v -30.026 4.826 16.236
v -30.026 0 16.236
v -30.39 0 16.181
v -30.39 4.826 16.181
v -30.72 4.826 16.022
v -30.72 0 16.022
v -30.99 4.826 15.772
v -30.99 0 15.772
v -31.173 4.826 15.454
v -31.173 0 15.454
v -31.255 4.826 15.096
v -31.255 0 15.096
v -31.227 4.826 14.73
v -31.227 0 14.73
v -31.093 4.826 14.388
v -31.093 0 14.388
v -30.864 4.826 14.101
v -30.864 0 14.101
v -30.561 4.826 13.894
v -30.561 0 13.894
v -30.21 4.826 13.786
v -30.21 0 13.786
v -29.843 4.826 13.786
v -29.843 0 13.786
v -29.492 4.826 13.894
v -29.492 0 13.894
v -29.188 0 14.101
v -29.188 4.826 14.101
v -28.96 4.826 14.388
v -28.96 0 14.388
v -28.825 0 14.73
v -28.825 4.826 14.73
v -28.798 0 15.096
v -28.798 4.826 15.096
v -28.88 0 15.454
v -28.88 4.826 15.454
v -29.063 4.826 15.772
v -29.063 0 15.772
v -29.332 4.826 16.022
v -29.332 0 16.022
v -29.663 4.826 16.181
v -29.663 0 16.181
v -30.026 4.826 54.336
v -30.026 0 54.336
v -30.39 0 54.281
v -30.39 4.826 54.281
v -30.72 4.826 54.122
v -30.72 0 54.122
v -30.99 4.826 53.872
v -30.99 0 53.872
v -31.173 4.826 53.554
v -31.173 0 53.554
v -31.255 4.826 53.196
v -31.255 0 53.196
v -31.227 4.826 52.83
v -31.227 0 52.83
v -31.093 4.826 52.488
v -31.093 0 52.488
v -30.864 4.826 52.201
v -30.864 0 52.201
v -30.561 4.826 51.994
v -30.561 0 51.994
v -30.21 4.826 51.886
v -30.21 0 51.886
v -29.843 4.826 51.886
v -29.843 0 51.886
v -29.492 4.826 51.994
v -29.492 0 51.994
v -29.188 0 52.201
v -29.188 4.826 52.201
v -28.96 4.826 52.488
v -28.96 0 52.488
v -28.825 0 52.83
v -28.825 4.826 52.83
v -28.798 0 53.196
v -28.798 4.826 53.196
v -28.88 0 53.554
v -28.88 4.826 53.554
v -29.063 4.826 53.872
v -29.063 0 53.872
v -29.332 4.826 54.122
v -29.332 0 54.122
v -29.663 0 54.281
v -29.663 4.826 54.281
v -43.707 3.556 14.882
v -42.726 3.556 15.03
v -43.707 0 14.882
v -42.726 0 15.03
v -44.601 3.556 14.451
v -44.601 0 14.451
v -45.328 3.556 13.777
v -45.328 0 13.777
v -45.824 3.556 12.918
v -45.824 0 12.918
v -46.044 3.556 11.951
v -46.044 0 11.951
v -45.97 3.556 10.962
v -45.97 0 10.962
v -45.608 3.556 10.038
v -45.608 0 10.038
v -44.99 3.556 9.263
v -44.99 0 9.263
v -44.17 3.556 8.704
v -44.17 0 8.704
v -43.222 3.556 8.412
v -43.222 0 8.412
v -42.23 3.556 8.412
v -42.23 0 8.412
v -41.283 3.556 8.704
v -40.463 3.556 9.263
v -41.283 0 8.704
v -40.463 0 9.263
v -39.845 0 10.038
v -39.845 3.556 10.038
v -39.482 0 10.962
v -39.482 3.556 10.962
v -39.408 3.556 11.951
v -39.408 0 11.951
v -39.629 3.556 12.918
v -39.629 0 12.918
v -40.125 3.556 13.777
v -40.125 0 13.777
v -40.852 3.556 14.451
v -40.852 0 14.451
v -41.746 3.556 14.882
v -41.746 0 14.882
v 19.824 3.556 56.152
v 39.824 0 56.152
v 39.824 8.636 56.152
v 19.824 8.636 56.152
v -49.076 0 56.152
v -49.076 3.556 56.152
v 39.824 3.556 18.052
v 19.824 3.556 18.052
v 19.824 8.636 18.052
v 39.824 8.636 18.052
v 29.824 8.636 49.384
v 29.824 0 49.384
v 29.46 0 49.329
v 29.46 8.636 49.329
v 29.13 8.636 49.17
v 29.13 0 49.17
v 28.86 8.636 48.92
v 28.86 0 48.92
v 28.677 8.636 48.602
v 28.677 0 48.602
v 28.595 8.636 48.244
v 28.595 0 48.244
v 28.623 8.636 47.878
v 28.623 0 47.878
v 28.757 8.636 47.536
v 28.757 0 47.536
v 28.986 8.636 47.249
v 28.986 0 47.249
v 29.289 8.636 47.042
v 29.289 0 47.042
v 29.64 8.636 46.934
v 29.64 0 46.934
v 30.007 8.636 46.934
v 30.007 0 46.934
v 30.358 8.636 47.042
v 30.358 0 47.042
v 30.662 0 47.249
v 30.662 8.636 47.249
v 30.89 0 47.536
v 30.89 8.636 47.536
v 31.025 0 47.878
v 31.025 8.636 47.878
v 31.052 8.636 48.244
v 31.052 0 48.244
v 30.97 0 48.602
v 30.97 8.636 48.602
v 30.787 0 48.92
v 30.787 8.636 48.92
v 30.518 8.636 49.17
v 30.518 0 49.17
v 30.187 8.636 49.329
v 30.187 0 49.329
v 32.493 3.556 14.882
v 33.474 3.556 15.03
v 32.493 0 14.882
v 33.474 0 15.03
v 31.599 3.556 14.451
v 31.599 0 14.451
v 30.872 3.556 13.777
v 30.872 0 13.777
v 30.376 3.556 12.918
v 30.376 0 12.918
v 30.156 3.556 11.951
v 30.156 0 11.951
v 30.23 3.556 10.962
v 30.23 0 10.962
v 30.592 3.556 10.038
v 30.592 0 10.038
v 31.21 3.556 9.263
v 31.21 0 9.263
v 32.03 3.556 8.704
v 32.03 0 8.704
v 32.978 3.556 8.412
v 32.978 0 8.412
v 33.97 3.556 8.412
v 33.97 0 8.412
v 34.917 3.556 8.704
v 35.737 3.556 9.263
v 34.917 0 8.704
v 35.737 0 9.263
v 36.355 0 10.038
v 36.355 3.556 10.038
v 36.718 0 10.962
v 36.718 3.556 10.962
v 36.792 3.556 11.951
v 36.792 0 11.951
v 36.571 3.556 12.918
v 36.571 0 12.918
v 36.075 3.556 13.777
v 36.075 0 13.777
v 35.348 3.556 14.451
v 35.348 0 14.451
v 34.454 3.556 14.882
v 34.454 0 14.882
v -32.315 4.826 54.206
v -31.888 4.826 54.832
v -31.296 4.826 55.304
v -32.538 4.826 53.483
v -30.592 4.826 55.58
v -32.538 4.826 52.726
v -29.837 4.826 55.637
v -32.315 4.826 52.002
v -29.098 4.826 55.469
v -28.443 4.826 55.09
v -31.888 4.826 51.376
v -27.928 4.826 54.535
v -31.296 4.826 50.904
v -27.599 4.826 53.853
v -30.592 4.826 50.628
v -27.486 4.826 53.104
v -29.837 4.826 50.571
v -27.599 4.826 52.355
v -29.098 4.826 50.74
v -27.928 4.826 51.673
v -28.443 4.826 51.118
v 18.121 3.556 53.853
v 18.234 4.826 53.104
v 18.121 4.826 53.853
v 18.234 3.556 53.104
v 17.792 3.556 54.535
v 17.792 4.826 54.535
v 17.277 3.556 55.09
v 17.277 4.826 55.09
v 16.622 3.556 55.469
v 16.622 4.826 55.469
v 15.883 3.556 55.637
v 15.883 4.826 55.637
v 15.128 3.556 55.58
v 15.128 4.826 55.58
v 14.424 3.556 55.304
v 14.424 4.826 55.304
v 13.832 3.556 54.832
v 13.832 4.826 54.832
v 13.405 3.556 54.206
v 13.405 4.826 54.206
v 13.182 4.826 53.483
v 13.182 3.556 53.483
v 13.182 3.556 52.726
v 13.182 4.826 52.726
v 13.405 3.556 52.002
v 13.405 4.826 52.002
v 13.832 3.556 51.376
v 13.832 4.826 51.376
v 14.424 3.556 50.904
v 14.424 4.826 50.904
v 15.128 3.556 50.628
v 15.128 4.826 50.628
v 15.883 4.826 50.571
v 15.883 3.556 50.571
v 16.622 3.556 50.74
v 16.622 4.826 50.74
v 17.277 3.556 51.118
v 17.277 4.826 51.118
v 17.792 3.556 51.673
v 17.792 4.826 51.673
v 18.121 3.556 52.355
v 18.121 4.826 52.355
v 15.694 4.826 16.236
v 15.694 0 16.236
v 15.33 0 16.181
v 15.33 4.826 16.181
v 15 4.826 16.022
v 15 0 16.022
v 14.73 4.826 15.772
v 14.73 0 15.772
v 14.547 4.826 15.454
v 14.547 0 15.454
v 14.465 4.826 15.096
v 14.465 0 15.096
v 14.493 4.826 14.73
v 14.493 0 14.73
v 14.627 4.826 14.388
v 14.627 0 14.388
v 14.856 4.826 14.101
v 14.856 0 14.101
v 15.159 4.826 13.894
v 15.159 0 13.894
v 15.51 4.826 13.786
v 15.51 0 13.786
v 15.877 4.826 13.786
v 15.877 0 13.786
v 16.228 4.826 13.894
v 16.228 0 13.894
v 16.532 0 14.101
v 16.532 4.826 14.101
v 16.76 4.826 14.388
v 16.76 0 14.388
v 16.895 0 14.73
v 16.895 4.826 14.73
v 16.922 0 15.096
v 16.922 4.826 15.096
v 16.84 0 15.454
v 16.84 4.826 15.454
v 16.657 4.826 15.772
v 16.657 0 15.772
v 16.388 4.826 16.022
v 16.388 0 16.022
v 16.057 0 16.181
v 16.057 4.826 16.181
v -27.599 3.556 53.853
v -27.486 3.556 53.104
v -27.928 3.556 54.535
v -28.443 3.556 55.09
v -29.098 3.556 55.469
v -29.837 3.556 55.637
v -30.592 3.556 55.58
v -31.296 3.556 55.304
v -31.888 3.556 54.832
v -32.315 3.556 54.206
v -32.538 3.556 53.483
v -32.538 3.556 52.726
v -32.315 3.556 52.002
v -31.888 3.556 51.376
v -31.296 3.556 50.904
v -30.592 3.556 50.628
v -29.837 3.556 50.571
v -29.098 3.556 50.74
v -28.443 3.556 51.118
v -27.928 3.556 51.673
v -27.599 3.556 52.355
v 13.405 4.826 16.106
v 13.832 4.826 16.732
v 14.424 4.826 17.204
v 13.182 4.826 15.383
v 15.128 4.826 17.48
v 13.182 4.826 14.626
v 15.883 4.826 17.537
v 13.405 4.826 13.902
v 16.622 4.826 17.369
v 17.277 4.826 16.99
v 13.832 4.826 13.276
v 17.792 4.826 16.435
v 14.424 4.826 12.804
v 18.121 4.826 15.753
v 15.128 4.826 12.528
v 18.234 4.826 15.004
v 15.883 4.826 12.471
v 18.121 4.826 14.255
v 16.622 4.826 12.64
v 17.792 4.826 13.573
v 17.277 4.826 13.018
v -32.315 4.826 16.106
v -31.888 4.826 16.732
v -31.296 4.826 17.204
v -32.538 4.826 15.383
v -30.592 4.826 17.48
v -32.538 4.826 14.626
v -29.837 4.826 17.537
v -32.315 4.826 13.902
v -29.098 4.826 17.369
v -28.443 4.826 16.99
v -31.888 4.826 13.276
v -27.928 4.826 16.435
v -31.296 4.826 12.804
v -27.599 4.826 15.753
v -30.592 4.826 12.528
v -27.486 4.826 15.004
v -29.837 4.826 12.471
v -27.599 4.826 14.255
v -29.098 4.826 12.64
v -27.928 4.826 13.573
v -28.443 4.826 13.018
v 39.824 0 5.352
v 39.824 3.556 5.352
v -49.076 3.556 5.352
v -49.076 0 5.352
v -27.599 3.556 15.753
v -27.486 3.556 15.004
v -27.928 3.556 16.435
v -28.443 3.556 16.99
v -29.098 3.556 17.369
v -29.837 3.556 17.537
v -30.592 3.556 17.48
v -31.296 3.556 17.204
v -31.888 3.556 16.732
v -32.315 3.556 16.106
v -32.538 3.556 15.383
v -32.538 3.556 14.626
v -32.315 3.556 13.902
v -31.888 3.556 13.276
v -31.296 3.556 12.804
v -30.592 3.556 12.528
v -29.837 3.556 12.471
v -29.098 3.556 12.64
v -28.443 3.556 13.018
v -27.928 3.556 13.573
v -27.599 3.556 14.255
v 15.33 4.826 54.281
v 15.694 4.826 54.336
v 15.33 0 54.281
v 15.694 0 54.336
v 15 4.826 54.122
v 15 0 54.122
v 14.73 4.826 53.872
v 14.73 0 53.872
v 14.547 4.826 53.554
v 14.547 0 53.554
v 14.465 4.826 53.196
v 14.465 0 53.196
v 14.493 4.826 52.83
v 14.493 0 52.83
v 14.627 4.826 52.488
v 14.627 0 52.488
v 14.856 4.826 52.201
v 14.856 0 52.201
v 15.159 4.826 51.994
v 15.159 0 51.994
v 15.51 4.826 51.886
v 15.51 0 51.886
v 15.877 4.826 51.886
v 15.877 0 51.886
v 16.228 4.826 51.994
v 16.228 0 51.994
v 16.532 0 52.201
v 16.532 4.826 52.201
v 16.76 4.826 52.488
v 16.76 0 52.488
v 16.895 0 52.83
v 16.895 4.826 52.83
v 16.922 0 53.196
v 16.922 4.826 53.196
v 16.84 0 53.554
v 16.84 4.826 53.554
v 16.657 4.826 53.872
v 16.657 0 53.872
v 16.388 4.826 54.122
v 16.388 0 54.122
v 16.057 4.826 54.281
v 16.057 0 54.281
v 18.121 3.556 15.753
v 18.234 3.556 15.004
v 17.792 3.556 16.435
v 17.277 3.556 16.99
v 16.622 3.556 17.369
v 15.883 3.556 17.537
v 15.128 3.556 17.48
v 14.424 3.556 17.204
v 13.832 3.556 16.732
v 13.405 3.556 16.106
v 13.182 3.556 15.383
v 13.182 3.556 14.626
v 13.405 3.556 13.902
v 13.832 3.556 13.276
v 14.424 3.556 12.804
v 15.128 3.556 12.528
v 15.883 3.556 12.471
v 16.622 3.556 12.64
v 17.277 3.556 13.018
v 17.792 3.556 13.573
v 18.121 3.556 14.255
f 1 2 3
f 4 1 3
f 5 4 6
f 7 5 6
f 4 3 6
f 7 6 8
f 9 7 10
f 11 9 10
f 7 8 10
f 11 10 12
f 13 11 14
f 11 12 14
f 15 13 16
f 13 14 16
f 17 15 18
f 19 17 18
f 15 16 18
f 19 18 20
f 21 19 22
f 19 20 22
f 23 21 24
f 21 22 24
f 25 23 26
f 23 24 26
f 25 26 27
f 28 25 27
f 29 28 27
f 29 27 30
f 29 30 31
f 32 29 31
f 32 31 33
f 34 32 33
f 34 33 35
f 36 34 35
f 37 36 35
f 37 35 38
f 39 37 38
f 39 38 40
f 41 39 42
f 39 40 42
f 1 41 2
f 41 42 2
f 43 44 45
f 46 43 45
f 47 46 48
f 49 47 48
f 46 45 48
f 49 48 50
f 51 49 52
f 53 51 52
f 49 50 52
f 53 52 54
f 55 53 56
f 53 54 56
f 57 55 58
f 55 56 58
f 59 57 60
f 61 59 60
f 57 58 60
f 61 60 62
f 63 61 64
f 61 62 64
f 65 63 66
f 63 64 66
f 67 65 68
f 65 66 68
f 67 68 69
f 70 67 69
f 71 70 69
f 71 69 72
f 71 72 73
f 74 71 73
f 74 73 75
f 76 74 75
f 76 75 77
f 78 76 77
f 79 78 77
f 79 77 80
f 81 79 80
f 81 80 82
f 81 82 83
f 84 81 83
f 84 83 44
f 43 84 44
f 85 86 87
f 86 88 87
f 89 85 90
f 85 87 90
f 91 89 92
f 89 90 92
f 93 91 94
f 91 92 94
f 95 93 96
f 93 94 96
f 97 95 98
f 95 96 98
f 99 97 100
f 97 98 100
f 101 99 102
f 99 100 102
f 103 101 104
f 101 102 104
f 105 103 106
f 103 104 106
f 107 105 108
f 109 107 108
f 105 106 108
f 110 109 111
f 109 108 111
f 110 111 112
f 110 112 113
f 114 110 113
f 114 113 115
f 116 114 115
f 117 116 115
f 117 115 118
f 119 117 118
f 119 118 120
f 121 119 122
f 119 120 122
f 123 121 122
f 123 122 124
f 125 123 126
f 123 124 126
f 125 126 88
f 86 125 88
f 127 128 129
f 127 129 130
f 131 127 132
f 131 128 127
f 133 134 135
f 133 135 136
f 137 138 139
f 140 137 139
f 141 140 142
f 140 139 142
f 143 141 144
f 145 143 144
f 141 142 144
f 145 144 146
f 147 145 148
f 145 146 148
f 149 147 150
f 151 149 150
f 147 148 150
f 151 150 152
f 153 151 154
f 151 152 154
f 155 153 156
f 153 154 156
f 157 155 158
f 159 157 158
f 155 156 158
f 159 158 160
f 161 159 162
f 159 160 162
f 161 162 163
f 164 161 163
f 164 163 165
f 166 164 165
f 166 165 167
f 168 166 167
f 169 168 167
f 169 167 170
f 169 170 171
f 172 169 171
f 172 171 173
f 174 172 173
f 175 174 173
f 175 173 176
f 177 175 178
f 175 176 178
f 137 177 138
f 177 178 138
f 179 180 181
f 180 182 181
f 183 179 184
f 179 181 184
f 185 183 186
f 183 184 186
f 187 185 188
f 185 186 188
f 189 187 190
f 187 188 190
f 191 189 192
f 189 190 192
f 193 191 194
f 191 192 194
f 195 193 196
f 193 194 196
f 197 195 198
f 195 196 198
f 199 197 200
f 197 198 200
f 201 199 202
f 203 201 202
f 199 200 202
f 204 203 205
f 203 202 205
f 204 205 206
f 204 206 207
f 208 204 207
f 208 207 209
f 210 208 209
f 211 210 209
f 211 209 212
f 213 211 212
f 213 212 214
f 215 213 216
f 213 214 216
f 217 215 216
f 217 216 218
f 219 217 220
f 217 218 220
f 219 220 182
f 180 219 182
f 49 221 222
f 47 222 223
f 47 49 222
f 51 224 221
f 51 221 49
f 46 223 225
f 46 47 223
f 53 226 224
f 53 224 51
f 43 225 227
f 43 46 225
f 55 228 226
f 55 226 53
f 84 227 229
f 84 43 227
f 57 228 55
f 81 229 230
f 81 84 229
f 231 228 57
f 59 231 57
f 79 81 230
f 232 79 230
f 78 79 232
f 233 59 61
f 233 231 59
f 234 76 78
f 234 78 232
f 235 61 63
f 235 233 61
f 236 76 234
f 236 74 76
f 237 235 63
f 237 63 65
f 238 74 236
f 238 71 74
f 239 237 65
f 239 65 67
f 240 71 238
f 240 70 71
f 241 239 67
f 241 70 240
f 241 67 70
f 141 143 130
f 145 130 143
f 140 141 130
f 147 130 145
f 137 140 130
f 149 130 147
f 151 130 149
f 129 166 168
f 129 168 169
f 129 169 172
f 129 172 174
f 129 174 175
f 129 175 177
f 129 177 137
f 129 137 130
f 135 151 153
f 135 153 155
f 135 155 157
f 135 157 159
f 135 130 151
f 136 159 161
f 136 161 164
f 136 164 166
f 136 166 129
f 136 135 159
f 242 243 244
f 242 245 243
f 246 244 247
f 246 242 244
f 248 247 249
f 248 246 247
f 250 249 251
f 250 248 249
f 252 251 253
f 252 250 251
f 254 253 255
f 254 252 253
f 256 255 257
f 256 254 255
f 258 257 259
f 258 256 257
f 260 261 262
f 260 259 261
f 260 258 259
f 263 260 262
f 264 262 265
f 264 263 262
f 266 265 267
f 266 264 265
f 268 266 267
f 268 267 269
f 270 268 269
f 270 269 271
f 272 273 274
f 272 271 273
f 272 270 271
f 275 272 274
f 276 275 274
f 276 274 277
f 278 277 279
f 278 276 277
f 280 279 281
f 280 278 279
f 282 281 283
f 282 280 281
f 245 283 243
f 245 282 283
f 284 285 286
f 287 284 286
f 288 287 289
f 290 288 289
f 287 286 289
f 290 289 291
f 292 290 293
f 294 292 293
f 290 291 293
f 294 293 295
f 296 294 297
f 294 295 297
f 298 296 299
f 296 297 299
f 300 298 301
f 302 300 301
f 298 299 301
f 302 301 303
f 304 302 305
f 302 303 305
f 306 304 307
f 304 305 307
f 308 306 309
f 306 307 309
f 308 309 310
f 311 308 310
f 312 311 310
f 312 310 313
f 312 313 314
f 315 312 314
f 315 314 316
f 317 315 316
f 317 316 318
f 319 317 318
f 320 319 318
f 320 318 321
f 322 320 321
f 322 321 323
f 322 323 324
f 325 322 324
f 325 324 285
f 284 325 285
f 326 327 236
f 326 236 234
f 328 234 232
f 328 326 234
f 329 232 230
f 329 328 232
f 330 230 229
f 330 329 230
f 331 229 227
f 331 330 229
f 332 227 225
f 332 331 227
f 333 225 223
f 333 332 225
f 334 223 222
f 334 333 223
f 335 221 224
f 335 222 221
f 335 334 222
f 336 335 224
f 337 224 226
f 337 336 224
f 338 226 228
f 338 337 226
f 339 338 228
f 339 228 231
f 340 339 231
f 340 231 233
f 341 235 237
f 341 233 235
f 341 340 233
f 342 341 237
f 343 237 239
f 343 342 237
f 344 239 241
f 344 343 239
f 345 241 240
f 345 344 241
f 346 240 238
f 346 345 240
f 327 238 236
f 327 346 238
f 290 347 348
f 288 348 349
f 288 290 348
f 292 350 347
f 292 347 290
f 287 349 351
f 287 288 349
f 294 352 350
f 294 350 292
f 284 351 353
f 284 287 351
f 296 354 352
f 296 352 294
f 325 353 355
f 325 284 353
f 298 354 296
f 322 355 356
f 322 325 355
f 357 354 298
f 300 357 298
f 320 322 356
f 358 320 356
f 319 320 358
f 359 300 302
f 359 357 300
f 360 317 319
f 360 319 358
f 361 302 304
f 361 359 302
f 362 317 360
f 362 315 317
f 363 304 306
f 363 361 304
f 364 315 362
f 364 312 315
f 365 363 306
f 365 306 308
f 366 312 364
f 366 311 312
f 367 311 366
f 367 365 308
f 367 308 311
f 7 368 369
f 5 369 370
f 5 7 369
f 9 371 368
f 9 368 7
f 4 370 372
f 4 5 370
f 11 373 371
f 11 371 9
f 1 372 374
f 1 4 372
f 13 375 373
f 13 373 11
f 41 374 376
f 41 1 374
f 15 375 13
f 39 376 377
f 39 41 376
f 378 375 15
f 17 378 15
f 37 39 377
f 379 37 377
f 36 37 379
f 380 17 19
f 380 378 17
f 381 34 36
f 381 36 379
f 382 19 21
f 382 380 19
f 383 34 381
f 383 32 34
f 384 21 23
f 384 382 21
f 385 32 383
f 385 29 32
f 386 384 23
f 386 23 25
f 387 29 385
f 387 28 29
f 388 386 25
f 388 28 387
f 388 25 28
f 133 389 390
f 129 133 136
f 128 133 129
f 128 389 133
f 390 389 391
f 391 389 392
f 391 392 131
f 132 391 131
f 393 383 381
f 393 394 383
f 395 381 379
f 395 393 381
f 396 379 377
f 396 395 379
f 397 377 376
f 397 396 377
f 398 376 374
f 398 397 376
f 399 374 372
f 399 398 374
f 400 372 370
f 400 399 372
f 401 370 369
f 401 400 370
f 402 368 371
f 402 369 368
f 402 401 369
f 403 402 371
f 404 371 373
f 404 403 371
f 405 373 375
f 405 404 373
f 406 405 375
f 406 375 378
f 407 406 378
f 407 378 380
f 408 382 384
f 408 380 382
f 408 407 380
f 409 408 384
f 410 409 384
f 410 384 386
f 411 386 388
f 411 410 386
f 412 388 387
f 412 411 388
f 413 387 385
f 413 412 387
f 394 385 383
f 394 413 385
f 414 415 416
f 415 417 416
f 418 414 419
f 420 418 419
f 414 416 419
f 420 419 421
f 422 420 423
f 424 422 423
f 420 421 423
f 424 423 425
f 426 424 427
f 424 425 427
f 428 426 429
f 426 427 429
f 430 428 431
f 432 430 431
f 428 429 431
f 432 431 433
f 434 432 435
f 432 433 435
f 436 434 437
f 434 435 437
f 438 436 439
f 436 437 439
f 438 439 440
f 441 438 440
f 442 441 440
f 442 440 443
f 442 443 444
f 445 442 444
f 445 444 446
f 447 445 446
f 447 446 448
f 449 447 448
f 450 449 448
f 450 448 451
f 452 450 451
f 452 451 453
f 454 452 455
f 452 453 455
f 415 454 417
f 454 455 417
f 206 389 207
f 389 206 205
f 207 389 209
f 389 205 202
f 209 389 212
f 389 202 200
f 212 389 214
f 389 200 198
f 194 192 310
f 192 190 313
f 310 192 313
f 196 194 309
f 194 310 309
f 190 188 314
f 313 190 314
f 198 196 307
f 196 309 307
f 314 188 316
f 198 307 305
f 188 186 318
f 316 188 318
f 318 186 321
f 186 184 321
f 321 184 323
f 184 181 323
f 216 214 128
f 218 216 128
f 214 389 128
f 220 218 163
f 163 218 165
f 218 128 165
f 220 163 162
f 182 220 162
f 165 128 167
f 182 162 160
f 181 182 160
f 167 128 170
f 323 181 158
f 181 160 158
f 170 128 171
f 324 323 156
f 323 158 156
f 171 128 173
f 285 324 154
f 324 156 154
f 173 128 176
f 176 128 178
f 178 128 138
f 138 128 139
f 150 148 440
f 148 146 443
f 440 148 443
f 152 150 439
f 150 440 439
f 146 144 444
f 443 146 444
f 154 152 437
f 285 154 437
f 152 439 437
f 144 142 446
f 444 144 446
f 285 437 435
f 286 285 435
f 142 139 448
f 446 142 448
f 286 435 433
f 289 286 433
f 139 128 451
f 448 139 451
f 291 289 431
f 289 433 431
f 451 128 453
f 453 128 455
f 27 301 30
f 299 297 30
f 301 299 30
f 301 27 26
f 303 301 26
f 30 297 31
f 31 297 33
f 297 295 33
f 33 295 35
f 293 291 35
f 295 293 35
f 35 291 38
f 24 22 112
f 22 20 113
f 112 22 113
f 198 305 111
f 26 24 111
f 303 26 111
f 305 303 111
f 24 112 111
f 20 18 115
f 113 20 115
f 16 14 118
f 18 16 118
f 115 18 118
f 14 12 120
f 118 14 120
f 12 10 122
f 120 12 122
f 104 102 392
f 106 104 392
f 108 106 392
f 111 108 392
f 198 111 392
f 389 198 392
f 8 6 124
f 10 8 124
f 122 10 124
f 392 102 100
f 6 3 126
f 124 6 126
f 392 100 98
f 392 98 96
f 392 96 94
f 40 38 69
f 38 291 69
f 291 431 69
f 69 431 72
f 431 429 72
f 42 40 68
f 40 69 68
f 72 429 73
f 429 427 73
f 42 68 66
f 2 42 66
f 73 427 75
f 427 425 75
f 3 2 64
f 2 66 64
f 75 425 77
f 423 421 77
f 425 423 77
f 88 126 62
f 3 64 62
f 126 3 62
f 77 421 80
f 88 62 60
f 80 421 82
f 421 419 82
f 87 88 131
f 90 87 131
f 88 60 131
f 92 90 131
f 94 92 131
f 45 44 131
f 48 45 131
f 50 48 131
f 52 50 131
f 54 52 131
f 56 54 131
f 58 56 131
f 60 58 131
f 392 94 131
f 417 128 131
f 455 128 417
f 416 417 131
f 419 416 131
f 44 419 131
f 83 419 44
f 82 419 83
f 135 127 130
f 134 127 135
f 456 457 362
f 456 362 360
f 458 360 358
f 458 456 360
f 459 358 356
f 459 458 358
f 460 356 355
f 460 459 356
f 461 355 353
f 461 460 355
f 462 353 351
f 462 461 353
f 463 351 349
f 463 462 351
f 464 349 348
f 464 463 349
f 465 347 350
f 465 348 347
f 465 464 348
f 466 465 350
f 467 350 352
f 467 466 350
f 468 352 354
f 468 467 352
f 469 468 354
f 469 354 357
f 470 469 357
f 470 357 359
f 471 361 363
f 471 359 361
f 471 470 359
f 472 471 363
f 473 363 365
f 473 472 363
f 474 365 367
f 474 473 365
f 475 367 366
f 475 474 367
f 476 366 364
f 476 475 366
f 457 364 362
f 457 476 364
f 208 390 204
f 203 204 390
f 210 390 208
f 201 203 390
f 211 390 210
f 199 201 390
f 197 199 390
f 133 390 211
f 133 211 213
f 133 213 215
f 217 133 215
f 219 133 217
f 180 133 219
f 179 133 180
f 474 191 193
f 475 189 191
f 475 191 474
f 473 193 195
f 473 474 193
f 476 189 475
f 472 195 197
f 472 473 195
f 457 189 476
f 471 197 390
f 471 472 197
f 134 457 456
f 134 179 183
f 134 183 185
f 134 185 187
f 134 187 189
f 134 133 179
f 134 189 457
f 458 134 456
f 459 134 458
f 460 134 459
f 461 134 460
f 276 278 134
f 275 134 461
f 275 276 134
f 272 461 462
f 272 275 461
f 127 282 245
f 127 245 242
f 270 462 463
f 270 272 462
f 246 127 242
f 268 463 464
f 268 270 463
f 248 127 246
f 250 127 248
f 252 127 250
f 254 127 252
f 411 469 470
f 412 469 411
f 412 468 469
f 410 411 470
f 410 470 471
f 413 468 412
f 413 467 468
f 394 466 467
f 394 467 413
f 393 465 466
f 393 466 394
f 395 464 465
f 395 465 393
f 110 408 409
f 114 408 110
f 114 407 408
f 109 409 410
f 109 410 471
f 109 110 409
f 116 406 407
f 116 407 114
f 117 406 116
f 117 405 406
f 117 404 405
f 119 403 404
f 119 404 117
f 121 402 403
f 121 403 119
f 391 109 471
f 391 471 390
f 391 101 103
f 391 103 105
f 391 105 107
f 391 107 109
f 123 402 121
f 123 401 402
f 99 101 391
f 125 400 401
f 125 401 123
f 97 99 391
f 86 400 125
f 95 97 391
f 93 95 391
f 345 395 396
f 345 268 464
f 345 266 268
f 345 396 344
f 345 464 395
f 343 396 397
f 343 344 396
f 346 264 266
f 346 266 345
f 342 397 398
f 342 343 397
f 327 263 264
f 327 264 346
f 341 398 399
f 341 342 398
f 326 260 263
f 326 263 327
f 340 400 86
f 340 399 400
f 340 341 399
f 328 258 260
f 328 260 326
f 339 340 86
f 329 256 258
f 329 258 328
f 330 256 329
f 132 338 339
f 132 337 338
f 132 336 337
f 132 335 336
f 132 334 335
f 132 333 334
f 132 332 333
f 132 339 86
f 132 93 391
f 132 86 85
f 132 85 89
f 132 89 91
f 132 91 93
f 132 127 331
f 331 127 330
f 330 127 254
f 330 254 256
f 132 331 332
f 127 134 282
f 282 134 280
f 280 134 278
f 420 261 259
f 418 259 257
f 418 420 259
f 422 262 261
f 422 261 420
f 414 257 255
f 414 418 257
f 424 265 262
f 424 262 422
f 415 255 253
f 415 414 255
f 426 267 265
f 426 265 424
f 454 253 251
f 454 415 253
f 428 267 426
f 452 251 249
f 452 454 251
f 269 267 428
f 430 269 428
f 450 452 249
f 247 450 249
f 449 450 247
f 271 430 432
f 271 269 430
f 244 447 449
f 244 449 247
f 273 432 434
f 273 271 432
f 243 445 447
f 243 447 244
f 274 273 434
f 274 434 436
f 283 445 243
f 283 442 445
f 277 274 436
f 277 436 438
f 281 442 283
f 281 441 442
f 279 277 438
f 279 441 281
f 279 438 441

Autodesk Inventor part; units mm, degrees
ref_plane "YZ Plane" through (0, 0, 0) normal (1, 0, 0) x (0, 1, 0)
ref_plane "XZ Plane" through (0, 0, 0) normal (0, 1, 0) x (-1, 0, 0)
ref_plane "XY Plane" through (0, 0, 0) normal (0, 0, 1) x (1, 0, 0)
sketch "Sketch1" plane through (0, 0, 0) normal (0, 1, 0) x (-1, 0, 0)
  line L0 (49.0764, 56.1521) -> (-39.8236, 56.1521)
  line L1 (-39.8236, 56.1521) -> (-39.8236, 5.3521)
  line L2 (-39.8236, 5.3521) -> (49.0764, 5.3521)
  line L3 (49.0764, 5.3521) -> (49.0764, 56.1521)
  point P0 (0, 0)
  dimension "d0" = 88.9
  dimension "d1" = 50.8
extrude "Extrusion1" add sketch "Sketch1" along normal blind 3.556
sketch "Sketch2" plane through (0, 3.556, 0) normal (0, 1, 0) x (1, 0, 0)
  line L0 (39.8236, -56.1521) -> (39.8236, -5.3521) projected
  line L1 (39.8236, -5.3521) -> (-49.0764, -5.3521) projected
  point P0 (0, 0)
  point P1 (-42.7264, -11.7021)
  point P2 (33.4736, -11.7021)
  dimension "d4" = 76.2
  dimension "d5" = 0
  dimension "d6" = 6.35
  dimension "d7" = 6.35
hole "Hole1" at (-42.7264, 3.556, 11.7021) at (33.4736, 3.556, 11.7021) direction (0, -1, 0) diameter 6.6548 end through all
sketch "Sketch3" plane through (0, 3.556, 0) normal (0, 1, 0) x (1, 0, 0)
  circle A0 centre (-30.0264, -53.1041) radius 2.54
  circle A1 centre (-30.0264, -15.0041) radius 2.54
  line L0 (-49.0764, -56.1521) -> (39.8236, -56.1521) projected
  line L1 (-49.0764, -5.3521) -> (-49.0764, -56.1521) projected
  circle A2 centre (15.6936, -53.1041) radius 2.54
  circle A3 centre (15.6936, -15.0041) radius 2.54
  point P0 (0, 0)
  dimension "d15" = 5.08
  dimension "d16" = 5.08
  dimension "d17" = 3.048
  dimension "d18" = 38.1
  dimension "d19" = 0
  dimension "d20" = 19.05
  dimension "d21" = 5.08
  dimension "d22" = 0
  dimension "d23" = 45.72
  dimension "d24" = 5.08
  dimension "d25" = 0
  dimension "d26" = 0
extrude "Extrusion2" add sketch "Sketch3" along normal blind 1.27
sketch "Sketch4" plane through (-30.0264, 4.826, 15.0041) normal (0, 1, 0) x (1, 0, 0)
  circle A0 centre (0, 0) radius 2.54 projected
  circle A1 centre (0, -38.1) radius 2.54 projected
  circle A2 centre (45.72, -38.1) radius 2.54 projected
  circle A3 centre (45.72, 0) radius 2.54 projected
  circle A4 centre (45.72, 0) radius 2.54 projected
  circle A5 centre (45.72, -38.1) radius 2.54 projected
  point P0 (30.0264, 15.0041)
  point P1 (45.72, 0)
hole "Hole2" at (-30.0264, 4.826, 53.1041) at (-30.0264, 4.826, 15.0041) at (15.6936, 4.826, 15.0041) at (15.6936, 4.826, 53.1041) direction (0, -1, 0) diameter 2.4638 end through all
sketch "Sketch5" plane through (0, 3.556, 0) normal (0, 1, 0) x (1, 0, 0)
  line L0 (19.8236, -18.0521) -> (39.8236, -18.0521)
  line L1 (39.8236, -18.0521) -> (39.8236, -56.1521)
  line L2 (39.8236, -56.1521) -> (19.8236, -56.1521)
  line L3 (19.8236, -56.1521) -> (19.8236, -18.0521)
  line L4 (39.8236, -56.1521) -> (39.8236, -5.3521) projected
  line L5 (-49.0764, -56.1521) -> (39.8236, -56.1521) projected
  line L6 (39.8236, -5.3521) -> (-49.0764, -5.3521) projected
  point P0 (0, 0)
  dimension "d36" = 0
  dimension "d37" = 20
  dimension "d38" = 0
  dimension "d40" = 12.7
extrude "Extrusion3" add sketch "Sketch5" along normal blind 5.08
sketch "Sketch6" plane through (0, 8.636, 0) normal (0, 1, 0) x (1, 0, 0)
  line L0 (19.8236, -56.1521) -> (39.8236, -56.1521) projected
  line L1 (39.8236, -56.1521) -> (39.8236, -18.0521) projected
  point P0 (0, 0)
  point P1 (29.8236, -48.1521)
  dimension "d43" = 8
  dimension "d44" = 10
hole "Hole3" at (29.8236, 8.636, 48.1521) direction (0, -1, 0) diameter 2.4638 end through all
properties part number "SF GPS"
